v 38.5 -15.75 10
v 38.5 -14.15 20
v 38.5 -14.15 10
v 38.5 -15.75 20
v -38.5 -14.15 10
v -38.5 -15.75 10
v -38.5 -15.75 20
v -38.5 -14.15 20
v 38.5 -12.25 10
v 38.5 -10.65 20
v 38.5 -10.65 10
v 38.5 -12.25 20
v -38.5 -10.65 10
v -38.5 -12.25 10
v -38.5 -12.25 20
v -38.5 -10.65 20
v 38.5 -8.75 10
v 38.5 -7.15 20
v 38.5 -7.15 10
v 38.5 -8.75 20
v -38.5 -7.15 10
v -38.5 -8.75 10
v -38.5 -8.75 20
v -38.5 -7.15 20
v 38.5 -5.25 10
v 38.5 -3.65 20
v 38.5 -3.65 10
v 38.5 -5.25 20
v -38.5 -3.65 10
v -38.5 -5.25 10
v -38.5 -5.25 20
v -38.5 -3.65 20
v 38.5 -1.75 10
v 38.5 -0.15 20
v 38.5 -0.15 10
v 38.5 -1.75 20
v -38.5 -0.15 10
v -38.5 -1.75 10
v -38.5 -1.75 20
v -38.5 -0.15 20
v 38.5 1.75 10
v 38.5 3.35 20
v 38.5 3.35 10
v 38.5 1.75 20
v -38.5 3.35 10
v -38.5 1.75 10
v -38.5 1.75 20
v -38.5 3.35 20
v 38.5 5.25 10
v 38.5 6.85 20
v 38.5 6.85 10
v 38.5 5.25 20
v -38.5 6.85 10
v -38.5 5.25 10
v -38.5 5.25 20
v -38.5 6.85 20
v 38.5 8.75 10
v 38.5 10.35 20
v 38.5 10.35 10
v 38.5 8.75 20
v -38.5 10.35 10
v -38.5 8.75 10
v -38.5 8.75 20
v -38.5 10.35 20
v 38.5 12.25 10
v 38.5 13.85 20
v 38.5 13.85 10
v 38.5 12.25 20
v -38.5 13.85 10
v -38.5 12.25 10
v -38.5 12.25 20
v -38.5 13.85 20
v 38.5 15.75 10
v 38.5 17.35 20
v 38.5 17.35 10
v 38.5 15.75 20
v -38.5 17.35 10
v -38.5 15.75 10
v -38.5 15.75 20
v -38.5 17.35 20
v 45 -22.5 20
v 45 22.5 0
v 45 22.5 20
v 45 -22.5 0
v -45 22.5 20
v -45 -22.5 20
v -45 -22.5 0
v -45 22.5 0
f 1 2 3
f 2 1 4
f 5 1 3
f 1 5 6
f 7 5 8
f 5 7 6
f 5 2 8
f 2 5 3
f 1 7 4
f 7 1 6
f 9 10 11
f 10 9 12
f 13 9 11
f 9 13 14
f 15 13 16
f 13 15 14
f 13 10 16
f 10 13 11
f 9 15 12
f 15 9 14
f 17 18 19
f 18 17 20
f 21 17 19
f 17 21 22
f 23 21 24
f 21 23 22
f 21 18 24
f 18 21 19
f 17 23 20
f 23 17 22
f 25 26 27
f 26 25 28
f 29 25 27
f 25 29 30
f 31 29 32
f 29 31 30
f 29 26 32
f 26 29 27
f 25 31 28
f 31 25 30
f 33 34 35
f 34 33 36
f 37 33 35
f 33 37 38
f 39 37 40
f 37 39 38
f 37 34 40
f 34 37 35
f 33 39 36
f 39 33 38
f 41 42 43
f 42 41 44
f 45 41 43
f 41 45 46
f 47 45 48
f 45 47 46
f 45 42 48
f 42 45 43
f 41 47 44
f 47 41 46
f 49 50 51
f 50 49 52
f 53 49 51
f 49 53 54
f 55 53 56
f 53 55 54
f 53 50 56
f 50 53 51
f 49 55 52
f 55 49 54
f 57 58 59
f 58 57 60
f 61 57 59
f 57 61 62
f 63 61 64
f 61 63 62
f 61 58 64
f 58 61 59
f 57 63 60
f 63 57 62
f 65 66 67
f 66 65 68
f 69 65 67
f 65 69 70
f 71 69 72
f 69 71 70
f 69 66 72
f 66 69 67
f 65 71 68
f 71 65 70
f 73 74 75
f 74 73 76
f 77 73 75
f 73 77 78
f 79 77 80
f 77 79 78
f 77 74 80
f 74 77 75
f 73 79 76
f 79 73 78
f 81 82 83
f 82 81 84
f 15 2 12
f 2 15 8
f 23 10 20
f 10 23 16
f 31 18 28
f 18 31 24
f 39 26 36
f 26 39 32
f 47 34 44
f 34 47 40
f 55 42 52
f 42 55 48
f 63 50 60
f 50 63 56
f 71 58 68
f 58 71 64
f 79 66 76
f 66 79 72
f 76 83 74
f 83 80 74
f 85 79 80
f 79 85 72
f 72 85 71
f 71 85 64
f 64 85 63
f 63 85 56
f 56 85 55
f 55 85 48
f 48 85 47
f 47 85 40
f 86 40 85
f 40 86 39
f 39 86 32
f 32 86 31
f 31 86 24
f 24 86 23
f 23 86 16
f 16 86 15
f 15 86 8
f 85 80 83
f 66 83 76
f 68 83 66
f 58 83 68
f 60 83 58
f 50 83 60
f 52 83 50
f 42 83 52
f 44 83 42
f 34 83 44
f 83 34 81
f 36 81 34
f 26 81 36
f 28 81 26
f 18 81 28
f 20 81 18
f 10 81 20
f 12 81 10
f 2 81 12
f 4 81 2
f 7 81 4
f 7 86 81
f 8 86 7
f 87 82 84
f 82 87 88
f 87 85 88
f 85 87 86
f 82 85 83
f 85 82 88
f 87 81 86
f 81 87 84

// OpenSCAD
// Microscope slide drying rack
// Print orientation: base block on the bed (z = 0), slots open upward.

// ---------------- Parameters ----------------
block_len    = 90;    // base block length along X (mm)
block_wid    = 45;    // base block width along Y (mm)
block_h      = 20;    // base block height along Z (mm)

slot_count   = 10;    // number of slide slots
slot_len     = 77;    // slot length along X (mm)
slot_w       = 1.6;   // slot width along Y (mm)
slot_depth   = 10;    // slot depth into the block (mm)
slot_pitch   = 3.5;   // centre-to-centre spacing of slots along Y (mm)

eps          = 0.5;   // overshoot so cutters pass cleanly through the top face (mm)

$fn = 64;

// ---------------- Model ----------------
difference() {
    // Solid base block, centred in X and Y, sitting on z = 0
    translate([-block_len / 2, -block_wid / 2, 0])
        cube([block_len, block_wid, block_h]);

    // Parallel slots running along X, centred as a group in X and Y
    for (i = [0 : slot_count - 1]) {
        x = (i - (slot_count - 1) / 2) * slot_pitch;   // slot centre in Y
        translate([-slot_len / 2, x, block_h - slot_depth])
            cube([slot_len, slot_w, slot_depth + eps]);
    }
}
